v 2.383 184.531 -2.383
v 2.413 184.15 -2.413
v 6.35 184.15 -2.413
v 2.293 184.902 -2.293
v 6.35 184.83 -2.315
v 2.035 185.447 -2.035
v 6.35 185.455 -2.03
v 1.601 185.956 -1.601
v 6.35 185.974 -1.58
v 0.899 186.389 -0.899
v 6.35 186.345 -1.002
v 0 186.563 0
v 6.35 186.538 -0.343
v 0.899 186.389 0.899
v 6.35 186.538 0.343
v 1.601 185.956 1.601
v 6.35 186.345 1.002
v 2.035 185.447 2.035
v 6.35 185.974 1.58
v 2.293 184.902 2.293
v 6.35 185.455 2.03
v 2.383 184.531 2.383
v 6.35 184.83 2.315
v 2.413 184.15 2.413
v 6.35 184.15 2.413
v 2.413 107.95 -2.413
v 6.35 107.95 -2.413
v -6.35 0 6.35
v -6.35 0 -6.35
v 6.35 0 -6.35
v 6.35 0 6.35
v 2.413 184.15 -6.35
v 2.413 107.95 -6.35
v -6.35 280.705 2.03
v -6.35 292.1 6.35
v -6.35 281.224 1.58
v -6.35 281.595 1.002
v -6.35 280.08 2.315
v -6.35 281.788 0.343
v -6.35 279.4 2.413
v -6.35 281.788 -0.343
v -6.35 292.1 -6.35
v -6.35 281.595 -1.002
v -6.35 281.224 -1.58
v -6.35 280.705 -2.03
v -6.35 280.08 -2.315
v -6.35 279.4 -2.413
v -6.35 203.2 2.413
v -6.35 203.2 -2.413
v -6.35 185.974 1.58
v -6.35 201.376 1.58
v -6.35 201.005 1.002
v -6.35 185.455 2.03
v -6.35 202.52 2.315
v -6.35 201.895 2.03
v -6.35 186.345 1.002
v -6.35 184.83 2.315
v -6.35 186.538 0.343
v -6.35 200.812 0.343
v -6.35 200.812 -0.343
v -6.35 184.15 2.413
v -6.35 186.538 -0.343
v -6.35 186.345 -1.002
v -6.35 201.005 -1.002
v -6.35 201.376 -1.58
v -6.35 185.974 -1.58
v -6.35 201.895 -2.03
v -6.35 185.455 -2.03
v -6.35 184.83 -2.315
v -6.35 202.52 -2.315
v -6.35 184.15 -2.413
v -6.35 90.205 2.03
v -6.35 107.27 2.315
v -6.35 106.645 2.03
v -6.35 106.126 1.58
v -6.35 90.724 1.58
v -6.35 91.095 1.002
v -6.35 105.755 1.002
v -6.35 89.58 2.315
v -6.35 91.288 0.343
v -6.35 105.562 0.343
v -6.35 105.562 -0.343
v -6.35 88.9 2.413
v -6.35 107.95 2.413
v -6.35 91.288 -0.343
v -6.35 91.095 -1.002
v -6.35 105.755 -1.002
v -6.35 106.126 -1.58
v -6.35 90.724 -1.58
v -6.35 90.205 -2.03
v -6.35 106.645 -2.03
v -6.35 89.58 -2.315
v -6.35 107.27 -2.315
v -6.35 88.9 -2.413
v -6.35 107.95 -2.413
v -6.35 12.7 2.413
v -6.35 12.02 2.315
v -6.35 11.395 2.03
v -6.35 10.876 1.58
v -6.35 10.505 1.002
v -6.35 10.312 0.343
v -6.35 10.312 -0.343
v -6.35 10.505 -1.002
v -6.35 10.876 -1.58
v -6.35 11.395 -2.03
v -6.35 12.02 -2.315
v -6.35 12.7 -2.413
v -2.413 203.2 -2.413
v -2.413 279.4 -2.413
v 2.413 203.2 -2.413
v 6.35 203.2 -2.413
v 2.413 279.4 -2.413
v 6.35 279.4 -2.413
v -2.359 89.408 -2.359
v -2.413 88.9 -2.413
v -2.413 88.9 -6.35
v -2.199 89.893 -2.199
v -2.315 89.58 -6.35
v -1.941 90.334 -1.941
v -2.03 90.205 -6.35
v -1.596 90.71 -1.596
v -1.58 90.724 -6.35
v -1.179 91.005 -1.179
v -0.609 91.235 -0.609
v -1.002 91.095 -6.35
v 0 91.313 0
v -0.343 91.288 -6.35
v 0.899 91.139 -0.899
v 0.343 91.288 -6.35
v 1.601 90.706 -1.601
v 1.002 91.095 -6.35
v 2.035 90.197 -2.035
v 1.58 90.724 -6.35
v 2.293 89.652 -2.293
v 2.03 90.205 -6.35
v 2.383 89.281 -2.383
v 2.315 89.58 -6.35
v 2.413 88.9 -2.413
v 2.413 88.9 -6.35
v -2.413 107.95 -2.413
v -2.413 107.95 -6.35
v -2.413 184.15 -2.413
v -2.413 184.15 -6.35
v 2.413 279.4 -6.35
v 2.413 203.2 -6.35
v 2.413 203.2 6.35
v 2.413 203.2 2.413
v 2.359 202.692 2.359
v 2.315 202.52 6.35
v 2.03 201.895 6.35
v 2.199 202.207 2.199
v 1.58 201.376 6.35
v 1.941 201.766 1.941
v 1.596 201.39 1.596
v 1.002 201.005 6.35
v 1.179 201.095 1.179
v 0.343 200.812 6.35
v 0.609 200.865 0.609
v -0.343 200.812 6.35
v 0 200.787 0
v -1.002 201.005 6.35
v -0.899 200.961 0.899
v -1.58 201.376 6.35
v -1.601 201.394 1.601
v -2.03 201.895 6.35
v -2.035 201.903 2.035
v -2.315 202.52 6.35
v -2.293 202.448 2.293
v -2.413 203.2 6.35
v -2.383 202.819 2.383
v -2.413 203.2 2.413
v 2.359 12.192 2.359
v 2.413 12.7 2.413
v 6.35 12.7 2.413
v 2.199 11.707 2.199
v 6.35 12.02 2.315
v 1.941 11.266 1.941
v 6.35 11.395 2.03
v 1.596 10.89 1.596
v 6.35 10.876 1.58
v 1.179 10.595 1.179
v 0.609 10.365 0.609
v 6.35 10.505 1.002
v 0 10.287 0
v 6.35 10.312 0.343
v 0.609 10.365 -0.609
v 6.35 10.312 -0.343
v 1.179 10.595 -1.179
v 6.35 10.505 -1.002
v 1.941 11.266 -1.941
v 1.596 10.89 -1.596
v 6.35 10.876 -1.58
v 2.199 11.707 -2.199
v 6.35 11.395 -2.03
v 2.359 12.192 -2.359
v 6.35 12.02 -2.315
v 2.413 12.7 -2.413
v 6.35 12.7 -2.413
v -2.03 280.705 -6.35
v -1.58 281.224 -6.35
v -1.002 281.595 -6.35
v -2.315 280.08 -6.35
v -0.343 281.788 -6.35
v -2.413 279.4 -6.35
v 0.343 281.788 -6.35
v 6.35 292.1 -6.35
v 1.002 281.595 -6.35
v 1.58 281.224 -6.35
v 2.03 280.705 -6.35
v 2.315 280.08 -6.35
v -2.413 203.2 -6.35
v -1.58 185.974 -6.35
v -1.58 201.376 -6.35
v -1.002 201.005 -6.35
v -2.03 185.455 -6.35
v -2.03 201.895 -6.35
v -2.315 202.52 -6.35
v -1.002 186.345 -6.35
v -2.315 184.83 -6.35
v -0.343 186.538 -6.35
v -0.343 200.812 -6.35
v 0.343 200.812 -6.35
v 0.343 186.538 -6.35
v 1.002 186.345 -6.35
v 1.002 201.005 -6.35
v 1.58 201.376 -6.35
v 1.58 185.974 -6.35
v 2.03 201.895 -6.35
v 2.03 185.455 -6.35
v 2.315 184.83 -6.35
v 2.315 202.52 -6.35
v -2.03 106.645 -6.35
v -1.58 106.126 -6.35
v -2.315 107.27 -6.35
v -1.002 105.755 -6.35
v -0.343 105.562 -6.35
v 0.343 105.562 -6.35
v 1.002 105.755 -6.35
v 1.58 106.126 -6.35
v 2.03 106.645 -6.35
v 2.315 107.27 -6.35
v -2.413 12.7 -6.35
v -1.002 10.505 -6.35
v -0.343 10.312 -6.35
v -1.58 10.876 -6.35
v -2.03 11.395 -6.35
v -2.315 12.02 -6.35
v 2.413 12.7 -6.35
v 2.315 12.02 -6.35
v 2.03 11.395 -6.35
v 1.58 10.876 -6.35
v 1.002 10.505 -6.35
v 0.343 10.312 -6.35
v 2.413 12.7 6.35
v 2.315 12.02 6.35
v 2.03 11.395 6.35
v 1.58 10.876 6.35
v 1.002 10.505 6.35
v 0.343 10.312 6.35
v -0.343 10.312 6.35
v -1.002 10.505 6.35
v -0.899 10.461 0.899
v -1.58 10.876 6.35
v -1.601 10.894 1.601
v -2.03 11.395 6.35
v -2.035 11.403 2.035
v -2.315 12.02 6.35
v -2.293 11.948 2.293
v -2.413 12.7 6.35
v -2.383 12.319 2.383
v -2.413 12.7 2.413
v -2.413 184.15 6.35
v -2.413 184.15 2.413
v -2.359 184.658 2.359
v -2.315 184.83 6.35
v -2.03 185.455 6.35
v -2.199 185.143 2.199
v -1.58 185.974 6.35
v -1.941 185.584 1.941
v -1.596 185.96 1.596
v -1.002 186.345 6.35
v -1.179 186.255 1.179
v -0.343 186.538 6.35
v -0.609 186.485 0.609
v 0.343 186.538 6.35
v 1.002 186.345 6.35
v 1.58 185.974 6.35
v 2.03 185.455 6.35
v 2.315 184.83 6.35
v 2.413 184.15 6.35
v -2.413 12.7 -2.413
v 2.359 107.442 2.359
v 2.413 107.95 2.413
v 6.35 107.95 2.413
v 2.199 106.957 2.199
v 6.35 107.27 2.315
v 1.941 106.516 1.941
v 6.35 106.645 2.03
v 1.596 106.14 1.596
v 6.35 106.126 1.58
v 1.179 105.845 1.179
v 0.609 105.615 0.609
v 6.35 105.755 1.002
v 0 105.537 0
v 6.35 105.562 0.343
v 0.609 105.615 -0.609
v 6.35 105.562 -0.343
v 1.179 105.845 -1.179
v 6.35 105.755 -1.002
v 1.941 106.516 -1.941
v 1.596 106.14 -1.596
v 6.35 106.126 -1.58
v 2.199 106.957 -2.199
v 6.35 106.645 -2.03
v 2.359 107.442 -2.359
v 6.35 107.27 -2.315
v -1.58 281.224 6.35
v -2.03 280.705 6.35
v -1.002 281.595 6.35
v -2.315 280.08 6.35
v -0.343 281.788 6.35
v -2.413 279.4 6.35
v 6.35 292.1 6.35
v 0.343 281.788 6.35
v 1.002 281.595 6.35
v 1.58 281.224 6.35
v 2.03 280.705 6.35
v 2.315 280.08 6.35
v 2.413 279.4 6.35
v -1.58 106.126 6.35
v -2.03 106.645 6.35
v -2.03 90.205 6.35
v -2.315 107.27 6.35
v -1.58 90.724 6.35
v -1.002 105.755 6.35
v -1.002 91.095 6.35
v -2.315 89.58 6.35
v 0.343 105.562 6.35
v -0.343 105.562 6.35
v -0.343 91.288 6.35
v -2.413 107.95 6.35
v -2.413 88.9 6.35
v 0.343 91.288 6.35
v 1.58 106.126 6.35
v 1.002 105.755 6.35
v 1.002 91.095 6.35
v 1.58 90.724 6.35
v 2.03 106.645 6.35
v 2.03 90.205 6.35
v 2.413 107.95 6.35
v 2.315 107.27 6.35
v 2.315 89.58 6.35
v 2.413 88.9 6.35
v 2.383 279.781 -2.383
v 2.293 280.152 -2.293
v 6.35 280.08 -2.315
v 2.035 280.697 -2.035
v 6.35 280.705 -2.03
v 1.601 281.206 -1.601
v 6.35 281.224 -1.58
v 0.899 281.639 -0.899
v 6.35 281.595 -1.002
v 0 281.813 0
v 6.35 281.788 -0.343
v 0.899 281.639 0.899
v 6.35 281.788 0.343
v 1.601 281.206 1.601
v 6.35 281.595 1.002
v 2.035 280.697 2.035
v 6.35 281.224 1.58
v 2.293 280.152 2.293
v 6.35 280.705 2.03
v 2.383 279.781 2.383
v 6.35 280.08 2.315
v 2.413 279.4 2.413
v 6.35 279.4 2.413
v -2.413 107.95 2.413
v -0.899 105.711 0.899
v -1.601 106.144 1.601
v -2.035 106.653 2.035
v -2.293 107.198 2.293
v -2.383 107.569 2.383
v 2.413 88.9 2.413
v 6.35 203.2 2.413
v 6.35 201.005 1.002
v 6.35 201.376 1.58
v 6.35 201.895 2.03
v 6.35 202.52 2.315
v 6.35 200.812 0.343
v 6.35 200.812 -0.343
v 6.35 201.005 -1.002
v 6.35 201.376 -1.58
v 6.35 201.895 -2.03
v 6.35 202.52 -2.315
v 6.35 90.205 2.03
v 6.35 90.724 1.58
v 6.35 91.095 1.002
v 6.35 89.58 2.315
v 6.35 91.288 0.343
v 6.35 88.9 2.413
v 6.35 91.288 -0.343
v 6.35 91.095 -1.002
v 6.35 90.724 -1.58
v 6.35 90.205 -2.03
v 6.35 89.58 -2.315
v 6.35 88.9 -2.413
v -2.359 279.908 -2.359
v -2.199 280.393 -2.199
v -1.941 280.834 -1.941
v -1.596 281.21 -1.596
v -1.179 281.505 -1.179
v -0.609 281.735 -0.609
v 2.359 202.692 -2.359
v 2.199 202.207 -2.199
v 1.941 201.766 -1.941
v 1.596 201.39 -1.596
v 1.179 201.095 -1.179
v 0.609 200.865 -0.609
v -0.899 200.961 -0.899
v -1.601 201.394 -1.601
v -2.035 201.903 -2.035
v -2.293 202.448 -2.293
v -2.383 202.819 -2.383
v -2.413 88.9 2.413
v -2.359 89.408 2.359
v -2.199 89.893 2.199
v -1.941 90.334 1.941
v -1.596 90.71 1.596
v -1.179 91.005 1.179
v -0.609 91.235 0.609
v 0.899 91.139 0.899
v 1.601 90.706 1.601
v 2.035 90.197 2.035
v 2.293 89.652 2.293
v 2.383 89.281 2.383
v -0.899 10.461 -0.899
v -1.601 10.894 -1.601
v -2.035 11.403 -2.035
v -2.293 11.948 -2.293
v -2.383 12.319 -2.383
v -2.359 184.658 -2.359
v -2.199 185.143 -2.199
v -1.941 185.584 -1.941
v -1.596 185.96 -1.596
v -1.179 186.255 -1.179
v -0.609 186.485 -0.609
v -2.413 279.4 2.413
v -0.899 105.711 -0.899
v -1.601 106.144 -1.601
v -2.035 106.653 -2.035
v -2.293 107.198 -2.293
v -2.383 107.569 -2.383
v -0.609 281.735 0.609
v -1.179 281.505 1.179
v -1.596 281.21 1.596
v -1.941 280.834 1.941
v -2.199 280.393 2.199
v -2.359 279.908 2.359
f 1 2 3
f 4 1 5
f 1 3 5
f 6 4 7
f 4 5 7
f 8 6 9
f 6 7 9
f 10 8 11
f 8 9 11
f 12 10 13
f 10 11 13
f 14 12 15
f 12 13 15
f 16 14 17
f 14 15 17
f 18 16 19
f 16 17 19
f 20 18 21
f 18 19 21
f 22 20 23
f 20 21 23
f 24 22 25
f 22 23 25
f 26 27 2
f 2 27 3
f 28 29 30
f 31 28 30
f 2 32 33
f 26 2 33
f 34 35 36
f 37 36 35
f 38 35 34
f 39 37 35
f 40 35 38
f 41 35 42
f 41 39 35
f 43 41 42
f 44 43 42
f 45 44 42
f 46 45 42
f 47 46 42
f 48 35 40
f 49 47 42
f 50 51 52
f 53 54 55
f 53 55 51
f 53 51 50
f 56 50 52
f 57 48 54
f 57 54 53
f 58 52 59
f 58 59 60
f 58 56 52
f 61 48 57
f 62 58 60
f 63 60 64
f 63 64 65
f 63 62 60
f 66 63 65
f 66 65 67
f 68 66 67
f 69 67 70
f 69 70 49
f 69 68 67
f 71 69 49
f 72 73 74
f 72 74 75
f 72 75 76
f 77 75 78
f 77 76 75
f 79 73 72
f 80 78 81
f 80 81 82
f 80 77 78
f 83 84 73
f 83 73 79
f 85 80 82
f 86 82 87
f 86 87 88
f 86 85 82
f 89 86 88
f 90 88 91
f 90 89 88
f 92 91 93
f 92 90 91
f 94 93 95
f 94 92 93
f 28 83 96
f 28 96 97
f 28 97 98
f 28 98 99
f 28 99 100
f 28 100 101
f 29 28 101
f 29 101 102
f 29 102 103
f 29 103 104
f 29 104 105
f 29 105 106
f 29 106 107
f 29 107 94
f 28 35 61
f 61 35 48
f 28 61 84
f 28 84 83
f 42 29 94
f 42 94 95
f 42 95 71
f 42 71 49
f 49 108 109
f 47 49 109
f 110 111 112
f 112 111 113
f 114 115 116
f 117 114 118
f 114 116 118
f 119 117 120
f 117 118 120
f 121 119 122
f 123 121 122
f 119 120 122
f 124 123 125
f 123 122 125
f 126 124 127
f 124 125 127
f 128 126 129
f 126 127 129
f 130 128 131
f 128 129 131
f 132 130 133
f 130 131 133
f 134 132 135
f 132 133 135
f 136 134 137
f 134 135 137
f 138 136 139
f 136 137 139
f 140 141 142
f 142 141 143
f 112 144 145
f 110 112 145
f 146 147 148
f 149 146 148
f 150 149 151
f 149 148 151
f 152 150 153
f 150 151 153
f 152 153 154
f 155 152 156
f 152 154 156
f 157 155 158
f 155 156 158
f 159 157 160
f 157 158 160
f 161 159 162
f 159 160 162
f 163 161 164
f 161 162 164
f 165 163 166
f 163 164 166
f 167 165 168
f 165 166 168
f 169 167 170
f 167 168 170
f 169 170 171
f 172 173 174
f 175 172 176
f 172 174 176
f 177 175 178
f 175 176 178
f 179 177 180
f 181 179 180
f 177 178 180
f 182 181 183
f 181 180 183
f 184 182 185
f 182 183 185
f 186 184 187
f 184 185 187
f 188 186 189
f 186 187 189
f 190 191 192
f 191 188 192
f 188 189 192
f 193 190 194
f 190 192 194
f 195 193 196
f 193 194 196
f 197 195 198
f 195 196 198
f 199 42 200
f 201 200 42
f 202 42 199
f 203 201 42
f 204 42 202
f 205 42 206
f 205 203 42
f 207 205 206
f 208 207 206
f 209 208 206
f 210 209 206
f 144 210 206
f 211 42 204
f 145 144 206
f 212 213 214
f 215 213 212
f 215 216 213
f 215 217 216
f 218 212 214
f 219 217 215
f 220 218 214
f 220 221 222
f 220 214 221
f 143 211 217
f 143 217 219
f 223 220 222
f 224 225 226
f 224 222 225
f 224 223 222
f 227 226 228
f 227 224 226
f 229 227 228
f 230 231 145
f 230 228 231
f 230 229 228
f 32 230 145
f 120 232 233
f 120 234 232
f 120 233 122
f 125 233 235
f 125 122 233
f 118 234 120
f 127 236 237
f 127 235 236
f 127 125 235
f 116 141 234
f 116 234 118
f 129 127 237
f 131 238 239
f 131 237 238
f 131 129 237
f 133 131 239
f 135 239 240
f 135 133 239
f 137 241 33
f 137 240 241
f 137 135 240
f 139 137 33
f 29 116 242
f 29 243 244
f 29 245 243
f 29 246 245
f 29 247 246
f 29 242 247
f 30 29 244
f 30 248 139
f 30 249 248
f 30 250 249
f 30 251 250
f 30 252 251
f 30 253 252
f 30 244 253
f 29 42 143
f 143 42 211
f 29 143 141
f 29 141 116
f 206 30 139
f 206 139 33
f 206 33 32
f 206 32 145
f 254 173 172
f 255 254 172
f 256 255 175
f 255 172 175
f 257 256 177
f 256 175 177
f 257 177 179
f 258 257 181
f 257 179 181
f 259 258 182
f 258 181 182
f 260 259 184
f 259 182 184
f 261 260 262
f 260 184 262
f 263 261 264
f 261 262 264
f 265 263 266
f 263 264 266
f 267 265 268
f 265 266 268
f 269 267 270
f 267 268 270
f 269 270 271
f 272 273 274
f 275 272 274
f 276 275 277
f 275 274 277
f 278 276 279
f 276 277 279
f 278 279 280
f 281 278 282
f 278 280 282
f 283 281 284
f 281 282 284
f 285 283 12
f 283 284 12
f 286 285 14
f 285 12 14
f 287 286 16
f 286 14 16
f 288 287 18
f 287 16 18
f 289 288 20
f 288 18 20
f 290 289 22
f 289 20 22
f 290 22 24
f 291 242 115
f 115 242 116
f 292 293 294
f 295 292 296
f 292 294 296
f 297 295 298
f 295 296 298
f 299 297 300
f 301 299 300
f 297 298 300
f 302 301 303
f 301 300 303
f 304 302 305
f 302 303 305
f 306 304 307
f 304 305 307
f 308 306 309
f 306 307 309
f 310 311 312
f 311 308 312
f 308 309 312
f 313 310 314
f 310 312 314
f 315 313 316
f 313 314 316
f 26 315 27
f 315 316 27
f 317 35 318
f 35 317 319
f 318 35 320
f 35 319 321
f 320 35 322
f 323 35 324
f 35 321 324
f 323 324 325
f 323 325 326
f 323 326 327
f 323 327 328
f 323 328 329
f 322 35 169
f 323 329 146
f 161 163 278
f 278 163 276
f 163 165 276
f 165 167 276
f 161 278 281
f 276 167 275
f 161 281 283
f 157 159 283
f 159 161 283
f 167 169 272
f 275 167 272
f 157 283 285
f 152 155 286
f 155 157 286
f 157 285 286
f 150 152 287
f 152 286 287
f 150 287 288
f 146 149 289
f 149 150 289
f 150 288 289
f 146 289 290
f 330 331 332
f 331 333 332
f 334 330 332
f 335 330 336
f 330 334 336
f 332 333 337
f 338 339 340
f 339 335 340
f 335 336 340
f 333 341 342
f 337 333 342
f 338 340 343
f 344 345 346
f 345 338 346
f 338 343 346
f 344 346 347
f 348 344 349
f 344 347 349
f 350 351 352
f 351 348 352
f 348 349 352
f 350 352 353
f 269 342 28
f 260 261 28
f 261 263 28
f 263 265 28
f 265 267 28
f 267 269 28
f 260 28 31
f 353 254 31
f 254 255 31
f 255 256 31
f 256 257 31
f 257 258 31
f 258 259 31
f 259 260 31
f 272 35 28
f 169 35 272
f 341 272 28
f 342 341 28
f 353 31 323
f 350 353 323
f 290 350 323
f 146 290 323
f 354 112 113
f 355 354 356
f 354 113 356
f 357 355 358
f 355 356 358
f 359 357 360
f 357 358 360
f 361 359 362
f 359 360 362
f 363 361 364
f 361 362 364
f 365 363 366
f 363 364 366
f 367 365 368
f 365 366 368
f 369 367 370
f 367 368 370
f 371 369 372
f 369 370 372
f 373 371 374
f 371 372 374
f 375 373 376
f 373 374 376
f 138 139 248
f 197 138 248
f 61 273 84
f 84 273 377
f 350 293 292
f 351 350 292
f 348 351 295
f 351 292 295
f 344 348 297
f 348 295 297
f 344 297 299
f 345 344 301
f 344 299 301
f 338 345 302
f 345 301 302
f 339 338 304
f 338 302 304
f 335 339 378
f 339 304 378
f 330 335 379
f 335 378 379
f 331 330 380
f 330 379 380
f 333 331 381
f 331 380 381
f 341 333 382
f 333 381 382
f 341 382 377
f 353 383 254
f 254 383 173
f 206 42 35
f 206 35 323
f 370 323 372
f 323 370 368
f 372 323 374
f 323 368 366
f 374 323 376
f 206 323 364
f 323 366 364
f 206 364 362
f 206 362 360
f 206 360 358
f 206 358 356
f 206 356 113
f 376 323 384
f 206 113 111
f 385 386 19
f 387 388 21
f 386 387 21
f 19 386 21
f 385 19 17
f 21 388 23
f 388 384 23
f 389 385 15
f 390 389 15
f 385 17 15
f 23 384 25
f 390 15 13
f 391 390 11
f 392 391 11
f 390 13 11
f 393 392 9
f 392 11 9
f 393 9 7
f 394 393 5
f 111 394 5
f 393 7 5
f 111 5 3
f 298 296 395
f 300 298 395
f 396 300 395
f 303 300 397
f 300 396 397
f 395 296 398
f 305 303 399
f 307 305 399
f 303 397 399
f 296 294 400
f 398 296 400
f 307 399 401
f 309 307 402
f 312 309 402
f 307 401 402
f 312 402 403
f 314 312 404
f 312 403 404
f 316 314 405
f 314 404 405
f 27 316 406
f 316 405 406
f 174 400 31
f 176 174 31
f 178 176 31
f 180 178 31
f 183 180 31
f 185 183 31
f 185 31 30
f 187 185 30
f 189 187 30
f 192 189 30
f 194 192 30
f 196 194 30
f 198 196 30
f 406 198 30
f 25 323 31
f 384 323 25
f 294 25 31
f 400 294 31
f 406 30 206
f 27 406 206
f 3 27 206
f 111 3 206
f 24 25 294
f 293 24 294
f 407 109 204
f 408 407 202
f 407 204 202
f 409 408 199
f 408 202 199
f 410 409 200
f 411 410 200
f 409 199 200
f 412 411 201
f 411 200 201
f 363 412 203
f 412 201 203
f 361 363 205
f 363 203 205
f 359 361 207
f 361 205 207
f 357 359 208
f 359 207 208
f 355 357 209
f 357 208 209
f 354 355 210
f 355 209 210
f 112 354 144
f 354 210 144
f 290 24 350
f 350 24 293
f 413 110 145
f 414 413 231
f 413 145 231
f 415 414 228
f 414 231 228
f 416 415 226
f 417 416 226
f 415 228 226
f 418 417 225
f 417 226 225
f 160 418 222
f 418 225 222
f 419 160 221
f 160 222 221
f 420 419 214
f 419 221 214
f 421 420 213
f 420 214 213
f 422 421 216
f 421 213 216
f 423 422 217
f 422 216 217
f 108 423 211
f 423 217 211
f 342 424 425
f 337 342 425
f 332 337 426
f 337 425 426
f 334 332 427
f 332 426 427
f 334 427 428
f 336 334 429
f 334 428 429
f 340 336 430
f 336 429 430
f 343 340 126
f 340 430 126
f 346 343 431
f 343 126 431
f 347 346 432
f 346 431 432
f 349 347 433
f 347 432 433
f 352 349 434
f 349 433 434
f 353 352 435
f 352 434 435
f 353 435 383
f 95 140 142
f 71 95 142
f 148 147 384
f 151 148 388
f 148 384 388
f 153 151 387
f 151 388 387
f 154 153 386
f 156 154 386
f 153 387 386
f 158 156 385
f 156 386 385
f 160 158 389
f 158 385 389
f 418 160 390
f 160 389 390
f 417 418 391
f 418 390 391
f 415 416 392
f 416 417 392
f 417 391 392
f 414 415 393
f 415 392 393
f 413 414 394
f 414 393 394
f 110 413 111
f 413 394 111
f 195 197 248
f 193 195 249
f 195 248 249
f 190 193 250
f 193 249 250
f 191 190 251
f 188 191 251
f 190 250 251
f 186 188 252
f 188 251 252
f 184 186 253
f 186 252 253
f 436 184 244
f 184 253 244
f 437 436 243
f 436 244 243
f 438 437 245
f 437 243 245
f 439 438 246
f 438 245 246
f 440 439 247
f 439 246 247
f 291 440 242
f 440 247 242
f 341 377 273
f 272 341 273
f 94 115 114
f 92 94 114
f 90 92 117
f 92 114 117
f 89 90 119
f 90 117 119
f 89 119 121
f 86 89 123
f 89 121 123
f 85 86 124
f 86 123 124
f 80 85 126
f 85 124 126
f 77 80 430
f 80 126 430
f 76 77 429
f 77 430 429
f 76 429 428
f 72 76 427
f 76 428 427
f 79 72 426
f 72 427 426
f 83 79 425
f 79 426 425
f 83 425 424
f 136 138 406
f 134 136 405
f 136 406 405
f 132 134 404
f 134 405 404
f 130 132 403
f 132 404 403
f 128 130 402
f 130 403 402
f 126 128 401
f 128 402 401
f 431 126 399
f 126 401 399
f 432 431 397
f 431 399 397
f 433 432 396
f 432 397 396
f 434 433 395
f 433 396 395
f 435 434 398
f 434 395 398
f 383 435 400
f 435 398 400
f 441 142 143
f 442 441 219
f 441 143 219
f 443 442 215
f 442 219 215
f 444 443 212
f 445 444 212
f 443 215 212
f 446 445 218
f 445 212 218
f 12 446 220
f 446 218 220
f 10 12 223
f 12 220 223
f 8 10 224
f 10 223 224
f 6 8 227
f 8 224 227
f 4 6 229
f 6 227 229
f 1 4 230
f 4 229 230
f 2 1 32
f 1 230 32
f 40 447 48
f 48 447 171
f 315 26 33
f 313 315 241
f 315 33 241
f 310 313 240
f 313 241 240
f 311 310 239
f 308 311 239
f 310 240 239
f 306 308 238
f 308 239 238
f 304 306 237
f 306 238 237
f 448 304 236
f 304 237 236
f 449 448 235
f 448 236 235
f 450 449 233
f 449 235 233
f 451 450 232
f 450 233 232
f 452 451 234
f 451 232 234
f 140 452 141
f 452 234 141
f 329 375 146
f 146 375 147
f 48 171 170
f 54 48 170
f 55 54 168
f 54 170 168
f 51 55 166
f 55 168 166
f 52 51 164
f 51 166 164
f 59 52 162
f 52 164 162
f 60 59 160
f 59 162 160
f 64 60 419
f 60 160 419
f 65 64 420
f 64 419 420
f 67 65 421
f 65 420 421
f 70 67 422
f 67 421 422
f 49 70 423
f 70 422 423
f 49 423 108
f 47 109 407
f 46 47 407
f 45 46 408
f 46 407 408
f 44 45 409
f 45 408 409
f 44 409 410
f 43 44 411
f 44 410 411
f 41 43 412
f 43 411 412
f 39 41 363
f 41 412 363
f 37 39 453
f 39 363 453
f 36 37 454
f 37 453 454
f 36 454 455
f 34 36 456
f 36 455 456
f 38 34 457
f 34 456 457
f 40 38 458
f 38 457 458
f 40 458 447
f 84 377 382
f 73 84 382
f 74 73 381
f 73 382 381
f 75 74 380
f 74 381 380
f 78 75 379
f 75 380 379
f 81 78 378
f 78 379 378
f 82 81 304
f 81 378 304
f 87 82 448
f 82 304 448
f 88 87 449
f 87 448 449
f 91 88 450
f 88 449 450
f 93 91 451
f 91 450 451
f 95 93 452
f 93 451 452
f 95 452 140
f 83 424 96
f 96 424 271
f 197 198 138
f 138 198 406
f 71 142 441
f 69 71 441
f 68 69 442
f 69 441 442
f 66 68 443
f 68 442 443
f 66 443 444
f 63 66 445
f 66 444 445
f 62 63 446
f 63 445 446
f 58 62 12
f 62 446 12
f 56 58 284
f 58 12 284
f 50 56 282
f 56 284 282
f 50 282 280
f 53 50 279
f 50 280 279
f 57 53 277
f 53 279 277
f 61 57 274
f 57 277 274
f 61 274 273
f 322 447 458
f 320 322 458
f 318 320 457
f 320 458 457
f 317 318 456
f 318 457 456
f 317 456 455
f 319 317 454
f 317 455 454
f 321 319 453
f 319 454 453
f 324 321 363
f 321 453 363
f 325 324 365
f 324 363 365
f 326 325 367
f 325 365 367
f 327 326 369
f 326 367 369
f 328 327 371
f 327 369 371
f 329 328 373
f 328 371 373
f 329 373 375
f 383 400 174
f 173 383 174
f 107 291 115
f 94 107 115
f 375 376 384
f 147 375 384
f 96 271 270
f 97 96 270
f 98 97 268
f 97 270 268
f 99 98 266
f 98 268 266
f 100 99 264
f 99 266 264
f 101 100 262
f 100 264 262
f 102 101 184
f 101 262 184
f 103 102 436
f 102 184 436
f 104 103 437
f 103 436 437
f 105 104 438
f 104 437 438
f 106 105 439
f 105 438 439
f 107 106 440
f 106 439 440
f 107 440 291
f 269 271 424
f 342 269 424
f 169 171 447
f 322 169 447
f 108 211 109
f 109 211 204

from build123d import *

# Parameters (mm, degrees)
SKETCH1_W           = 12.7
SKETCH1_H           = 12.7
BOSS_EXTRUDE1_DEPTH = 292.1
CUT_EXTRUDE1_DEPTH  = 13.7
CUT_EXTRUDE2_DEPTH  = 13.7
LPATTERN1_COUNT     = 3
LPATTERN1_PITCH     = 95.25


with BuildPart() as part:
    # Sketch1 → Boss-Extrude1 (new body)
    with BuildSketch(Plane(origin=(0, 0, 0), x_dir=(1, 0, 0), z_dir=(0, 1, 0))):
        Rectangle(SKETCH1_W, SKETCH1_H)
    extrude(amount=BOSS_EXTRUDE1_DEPTH)

    # Sketch2 → Cut-Extrude1 (cut, through all)
    with BuildSketch(Plane(origin=(0, 0, -6.35), x_dir=(-1, 0, 0), z_dir=(0, 0, -1))):
        with BuildLine():
            Line((-2.413, 279.4), (-2.413, 203.2))
            ThreePointArc((-2.413, 203.2), (0, 200.787), (2.413, 203.2))
            Line((2.413, 203.2), (2.413, 279.4))
            ThreePointArc((2.413, 279.4), (0, 281.813), (-2.413, 279.4))
        make_face()
    cut_extrude1 = extrude(amount=-CUT_EXTRUDE1_DEPTH, mode=Mode.SUBTRACT)

    # Sketch3 → Cut-Extrude2 (cut, through all)
    with BuildSketch(Plane(origin=(6.35, 0, 0), x_dir=(0, 0, -1), z_dir=(1, 0, 0))):
        with BuildLine():
            Line((-2.413, 279.4), (-2.413, 203.2))
            ThreePointArc((-2.413, 203.2), (0, 200.787), (2.413, 203.2))
            Line((2.413, 203.2), (2.413, 279.4))
            ThreePointArc((2.413, 279.4), (0, 281.813), (-2.413, 279.4))
        make_face()
    cut_extrude2 = extrude(amount=-CUT_EXTRUDE2_DEPTH, mode=Mode.SUBTRACT)

    # LPattern1: Cut-Extrude1, Cut-Extrude2 ×3
    with Locations(*[(0, -i * LPATTERN1_PITCH, 0) for i in range(1, LPATTERN1_COUNT)]):
        add(cut_extrude1, mode=Mode.SUBTRACT)
        add(cut_extrude2, mode=Mode.SUBTRACT)


solid = part.part
